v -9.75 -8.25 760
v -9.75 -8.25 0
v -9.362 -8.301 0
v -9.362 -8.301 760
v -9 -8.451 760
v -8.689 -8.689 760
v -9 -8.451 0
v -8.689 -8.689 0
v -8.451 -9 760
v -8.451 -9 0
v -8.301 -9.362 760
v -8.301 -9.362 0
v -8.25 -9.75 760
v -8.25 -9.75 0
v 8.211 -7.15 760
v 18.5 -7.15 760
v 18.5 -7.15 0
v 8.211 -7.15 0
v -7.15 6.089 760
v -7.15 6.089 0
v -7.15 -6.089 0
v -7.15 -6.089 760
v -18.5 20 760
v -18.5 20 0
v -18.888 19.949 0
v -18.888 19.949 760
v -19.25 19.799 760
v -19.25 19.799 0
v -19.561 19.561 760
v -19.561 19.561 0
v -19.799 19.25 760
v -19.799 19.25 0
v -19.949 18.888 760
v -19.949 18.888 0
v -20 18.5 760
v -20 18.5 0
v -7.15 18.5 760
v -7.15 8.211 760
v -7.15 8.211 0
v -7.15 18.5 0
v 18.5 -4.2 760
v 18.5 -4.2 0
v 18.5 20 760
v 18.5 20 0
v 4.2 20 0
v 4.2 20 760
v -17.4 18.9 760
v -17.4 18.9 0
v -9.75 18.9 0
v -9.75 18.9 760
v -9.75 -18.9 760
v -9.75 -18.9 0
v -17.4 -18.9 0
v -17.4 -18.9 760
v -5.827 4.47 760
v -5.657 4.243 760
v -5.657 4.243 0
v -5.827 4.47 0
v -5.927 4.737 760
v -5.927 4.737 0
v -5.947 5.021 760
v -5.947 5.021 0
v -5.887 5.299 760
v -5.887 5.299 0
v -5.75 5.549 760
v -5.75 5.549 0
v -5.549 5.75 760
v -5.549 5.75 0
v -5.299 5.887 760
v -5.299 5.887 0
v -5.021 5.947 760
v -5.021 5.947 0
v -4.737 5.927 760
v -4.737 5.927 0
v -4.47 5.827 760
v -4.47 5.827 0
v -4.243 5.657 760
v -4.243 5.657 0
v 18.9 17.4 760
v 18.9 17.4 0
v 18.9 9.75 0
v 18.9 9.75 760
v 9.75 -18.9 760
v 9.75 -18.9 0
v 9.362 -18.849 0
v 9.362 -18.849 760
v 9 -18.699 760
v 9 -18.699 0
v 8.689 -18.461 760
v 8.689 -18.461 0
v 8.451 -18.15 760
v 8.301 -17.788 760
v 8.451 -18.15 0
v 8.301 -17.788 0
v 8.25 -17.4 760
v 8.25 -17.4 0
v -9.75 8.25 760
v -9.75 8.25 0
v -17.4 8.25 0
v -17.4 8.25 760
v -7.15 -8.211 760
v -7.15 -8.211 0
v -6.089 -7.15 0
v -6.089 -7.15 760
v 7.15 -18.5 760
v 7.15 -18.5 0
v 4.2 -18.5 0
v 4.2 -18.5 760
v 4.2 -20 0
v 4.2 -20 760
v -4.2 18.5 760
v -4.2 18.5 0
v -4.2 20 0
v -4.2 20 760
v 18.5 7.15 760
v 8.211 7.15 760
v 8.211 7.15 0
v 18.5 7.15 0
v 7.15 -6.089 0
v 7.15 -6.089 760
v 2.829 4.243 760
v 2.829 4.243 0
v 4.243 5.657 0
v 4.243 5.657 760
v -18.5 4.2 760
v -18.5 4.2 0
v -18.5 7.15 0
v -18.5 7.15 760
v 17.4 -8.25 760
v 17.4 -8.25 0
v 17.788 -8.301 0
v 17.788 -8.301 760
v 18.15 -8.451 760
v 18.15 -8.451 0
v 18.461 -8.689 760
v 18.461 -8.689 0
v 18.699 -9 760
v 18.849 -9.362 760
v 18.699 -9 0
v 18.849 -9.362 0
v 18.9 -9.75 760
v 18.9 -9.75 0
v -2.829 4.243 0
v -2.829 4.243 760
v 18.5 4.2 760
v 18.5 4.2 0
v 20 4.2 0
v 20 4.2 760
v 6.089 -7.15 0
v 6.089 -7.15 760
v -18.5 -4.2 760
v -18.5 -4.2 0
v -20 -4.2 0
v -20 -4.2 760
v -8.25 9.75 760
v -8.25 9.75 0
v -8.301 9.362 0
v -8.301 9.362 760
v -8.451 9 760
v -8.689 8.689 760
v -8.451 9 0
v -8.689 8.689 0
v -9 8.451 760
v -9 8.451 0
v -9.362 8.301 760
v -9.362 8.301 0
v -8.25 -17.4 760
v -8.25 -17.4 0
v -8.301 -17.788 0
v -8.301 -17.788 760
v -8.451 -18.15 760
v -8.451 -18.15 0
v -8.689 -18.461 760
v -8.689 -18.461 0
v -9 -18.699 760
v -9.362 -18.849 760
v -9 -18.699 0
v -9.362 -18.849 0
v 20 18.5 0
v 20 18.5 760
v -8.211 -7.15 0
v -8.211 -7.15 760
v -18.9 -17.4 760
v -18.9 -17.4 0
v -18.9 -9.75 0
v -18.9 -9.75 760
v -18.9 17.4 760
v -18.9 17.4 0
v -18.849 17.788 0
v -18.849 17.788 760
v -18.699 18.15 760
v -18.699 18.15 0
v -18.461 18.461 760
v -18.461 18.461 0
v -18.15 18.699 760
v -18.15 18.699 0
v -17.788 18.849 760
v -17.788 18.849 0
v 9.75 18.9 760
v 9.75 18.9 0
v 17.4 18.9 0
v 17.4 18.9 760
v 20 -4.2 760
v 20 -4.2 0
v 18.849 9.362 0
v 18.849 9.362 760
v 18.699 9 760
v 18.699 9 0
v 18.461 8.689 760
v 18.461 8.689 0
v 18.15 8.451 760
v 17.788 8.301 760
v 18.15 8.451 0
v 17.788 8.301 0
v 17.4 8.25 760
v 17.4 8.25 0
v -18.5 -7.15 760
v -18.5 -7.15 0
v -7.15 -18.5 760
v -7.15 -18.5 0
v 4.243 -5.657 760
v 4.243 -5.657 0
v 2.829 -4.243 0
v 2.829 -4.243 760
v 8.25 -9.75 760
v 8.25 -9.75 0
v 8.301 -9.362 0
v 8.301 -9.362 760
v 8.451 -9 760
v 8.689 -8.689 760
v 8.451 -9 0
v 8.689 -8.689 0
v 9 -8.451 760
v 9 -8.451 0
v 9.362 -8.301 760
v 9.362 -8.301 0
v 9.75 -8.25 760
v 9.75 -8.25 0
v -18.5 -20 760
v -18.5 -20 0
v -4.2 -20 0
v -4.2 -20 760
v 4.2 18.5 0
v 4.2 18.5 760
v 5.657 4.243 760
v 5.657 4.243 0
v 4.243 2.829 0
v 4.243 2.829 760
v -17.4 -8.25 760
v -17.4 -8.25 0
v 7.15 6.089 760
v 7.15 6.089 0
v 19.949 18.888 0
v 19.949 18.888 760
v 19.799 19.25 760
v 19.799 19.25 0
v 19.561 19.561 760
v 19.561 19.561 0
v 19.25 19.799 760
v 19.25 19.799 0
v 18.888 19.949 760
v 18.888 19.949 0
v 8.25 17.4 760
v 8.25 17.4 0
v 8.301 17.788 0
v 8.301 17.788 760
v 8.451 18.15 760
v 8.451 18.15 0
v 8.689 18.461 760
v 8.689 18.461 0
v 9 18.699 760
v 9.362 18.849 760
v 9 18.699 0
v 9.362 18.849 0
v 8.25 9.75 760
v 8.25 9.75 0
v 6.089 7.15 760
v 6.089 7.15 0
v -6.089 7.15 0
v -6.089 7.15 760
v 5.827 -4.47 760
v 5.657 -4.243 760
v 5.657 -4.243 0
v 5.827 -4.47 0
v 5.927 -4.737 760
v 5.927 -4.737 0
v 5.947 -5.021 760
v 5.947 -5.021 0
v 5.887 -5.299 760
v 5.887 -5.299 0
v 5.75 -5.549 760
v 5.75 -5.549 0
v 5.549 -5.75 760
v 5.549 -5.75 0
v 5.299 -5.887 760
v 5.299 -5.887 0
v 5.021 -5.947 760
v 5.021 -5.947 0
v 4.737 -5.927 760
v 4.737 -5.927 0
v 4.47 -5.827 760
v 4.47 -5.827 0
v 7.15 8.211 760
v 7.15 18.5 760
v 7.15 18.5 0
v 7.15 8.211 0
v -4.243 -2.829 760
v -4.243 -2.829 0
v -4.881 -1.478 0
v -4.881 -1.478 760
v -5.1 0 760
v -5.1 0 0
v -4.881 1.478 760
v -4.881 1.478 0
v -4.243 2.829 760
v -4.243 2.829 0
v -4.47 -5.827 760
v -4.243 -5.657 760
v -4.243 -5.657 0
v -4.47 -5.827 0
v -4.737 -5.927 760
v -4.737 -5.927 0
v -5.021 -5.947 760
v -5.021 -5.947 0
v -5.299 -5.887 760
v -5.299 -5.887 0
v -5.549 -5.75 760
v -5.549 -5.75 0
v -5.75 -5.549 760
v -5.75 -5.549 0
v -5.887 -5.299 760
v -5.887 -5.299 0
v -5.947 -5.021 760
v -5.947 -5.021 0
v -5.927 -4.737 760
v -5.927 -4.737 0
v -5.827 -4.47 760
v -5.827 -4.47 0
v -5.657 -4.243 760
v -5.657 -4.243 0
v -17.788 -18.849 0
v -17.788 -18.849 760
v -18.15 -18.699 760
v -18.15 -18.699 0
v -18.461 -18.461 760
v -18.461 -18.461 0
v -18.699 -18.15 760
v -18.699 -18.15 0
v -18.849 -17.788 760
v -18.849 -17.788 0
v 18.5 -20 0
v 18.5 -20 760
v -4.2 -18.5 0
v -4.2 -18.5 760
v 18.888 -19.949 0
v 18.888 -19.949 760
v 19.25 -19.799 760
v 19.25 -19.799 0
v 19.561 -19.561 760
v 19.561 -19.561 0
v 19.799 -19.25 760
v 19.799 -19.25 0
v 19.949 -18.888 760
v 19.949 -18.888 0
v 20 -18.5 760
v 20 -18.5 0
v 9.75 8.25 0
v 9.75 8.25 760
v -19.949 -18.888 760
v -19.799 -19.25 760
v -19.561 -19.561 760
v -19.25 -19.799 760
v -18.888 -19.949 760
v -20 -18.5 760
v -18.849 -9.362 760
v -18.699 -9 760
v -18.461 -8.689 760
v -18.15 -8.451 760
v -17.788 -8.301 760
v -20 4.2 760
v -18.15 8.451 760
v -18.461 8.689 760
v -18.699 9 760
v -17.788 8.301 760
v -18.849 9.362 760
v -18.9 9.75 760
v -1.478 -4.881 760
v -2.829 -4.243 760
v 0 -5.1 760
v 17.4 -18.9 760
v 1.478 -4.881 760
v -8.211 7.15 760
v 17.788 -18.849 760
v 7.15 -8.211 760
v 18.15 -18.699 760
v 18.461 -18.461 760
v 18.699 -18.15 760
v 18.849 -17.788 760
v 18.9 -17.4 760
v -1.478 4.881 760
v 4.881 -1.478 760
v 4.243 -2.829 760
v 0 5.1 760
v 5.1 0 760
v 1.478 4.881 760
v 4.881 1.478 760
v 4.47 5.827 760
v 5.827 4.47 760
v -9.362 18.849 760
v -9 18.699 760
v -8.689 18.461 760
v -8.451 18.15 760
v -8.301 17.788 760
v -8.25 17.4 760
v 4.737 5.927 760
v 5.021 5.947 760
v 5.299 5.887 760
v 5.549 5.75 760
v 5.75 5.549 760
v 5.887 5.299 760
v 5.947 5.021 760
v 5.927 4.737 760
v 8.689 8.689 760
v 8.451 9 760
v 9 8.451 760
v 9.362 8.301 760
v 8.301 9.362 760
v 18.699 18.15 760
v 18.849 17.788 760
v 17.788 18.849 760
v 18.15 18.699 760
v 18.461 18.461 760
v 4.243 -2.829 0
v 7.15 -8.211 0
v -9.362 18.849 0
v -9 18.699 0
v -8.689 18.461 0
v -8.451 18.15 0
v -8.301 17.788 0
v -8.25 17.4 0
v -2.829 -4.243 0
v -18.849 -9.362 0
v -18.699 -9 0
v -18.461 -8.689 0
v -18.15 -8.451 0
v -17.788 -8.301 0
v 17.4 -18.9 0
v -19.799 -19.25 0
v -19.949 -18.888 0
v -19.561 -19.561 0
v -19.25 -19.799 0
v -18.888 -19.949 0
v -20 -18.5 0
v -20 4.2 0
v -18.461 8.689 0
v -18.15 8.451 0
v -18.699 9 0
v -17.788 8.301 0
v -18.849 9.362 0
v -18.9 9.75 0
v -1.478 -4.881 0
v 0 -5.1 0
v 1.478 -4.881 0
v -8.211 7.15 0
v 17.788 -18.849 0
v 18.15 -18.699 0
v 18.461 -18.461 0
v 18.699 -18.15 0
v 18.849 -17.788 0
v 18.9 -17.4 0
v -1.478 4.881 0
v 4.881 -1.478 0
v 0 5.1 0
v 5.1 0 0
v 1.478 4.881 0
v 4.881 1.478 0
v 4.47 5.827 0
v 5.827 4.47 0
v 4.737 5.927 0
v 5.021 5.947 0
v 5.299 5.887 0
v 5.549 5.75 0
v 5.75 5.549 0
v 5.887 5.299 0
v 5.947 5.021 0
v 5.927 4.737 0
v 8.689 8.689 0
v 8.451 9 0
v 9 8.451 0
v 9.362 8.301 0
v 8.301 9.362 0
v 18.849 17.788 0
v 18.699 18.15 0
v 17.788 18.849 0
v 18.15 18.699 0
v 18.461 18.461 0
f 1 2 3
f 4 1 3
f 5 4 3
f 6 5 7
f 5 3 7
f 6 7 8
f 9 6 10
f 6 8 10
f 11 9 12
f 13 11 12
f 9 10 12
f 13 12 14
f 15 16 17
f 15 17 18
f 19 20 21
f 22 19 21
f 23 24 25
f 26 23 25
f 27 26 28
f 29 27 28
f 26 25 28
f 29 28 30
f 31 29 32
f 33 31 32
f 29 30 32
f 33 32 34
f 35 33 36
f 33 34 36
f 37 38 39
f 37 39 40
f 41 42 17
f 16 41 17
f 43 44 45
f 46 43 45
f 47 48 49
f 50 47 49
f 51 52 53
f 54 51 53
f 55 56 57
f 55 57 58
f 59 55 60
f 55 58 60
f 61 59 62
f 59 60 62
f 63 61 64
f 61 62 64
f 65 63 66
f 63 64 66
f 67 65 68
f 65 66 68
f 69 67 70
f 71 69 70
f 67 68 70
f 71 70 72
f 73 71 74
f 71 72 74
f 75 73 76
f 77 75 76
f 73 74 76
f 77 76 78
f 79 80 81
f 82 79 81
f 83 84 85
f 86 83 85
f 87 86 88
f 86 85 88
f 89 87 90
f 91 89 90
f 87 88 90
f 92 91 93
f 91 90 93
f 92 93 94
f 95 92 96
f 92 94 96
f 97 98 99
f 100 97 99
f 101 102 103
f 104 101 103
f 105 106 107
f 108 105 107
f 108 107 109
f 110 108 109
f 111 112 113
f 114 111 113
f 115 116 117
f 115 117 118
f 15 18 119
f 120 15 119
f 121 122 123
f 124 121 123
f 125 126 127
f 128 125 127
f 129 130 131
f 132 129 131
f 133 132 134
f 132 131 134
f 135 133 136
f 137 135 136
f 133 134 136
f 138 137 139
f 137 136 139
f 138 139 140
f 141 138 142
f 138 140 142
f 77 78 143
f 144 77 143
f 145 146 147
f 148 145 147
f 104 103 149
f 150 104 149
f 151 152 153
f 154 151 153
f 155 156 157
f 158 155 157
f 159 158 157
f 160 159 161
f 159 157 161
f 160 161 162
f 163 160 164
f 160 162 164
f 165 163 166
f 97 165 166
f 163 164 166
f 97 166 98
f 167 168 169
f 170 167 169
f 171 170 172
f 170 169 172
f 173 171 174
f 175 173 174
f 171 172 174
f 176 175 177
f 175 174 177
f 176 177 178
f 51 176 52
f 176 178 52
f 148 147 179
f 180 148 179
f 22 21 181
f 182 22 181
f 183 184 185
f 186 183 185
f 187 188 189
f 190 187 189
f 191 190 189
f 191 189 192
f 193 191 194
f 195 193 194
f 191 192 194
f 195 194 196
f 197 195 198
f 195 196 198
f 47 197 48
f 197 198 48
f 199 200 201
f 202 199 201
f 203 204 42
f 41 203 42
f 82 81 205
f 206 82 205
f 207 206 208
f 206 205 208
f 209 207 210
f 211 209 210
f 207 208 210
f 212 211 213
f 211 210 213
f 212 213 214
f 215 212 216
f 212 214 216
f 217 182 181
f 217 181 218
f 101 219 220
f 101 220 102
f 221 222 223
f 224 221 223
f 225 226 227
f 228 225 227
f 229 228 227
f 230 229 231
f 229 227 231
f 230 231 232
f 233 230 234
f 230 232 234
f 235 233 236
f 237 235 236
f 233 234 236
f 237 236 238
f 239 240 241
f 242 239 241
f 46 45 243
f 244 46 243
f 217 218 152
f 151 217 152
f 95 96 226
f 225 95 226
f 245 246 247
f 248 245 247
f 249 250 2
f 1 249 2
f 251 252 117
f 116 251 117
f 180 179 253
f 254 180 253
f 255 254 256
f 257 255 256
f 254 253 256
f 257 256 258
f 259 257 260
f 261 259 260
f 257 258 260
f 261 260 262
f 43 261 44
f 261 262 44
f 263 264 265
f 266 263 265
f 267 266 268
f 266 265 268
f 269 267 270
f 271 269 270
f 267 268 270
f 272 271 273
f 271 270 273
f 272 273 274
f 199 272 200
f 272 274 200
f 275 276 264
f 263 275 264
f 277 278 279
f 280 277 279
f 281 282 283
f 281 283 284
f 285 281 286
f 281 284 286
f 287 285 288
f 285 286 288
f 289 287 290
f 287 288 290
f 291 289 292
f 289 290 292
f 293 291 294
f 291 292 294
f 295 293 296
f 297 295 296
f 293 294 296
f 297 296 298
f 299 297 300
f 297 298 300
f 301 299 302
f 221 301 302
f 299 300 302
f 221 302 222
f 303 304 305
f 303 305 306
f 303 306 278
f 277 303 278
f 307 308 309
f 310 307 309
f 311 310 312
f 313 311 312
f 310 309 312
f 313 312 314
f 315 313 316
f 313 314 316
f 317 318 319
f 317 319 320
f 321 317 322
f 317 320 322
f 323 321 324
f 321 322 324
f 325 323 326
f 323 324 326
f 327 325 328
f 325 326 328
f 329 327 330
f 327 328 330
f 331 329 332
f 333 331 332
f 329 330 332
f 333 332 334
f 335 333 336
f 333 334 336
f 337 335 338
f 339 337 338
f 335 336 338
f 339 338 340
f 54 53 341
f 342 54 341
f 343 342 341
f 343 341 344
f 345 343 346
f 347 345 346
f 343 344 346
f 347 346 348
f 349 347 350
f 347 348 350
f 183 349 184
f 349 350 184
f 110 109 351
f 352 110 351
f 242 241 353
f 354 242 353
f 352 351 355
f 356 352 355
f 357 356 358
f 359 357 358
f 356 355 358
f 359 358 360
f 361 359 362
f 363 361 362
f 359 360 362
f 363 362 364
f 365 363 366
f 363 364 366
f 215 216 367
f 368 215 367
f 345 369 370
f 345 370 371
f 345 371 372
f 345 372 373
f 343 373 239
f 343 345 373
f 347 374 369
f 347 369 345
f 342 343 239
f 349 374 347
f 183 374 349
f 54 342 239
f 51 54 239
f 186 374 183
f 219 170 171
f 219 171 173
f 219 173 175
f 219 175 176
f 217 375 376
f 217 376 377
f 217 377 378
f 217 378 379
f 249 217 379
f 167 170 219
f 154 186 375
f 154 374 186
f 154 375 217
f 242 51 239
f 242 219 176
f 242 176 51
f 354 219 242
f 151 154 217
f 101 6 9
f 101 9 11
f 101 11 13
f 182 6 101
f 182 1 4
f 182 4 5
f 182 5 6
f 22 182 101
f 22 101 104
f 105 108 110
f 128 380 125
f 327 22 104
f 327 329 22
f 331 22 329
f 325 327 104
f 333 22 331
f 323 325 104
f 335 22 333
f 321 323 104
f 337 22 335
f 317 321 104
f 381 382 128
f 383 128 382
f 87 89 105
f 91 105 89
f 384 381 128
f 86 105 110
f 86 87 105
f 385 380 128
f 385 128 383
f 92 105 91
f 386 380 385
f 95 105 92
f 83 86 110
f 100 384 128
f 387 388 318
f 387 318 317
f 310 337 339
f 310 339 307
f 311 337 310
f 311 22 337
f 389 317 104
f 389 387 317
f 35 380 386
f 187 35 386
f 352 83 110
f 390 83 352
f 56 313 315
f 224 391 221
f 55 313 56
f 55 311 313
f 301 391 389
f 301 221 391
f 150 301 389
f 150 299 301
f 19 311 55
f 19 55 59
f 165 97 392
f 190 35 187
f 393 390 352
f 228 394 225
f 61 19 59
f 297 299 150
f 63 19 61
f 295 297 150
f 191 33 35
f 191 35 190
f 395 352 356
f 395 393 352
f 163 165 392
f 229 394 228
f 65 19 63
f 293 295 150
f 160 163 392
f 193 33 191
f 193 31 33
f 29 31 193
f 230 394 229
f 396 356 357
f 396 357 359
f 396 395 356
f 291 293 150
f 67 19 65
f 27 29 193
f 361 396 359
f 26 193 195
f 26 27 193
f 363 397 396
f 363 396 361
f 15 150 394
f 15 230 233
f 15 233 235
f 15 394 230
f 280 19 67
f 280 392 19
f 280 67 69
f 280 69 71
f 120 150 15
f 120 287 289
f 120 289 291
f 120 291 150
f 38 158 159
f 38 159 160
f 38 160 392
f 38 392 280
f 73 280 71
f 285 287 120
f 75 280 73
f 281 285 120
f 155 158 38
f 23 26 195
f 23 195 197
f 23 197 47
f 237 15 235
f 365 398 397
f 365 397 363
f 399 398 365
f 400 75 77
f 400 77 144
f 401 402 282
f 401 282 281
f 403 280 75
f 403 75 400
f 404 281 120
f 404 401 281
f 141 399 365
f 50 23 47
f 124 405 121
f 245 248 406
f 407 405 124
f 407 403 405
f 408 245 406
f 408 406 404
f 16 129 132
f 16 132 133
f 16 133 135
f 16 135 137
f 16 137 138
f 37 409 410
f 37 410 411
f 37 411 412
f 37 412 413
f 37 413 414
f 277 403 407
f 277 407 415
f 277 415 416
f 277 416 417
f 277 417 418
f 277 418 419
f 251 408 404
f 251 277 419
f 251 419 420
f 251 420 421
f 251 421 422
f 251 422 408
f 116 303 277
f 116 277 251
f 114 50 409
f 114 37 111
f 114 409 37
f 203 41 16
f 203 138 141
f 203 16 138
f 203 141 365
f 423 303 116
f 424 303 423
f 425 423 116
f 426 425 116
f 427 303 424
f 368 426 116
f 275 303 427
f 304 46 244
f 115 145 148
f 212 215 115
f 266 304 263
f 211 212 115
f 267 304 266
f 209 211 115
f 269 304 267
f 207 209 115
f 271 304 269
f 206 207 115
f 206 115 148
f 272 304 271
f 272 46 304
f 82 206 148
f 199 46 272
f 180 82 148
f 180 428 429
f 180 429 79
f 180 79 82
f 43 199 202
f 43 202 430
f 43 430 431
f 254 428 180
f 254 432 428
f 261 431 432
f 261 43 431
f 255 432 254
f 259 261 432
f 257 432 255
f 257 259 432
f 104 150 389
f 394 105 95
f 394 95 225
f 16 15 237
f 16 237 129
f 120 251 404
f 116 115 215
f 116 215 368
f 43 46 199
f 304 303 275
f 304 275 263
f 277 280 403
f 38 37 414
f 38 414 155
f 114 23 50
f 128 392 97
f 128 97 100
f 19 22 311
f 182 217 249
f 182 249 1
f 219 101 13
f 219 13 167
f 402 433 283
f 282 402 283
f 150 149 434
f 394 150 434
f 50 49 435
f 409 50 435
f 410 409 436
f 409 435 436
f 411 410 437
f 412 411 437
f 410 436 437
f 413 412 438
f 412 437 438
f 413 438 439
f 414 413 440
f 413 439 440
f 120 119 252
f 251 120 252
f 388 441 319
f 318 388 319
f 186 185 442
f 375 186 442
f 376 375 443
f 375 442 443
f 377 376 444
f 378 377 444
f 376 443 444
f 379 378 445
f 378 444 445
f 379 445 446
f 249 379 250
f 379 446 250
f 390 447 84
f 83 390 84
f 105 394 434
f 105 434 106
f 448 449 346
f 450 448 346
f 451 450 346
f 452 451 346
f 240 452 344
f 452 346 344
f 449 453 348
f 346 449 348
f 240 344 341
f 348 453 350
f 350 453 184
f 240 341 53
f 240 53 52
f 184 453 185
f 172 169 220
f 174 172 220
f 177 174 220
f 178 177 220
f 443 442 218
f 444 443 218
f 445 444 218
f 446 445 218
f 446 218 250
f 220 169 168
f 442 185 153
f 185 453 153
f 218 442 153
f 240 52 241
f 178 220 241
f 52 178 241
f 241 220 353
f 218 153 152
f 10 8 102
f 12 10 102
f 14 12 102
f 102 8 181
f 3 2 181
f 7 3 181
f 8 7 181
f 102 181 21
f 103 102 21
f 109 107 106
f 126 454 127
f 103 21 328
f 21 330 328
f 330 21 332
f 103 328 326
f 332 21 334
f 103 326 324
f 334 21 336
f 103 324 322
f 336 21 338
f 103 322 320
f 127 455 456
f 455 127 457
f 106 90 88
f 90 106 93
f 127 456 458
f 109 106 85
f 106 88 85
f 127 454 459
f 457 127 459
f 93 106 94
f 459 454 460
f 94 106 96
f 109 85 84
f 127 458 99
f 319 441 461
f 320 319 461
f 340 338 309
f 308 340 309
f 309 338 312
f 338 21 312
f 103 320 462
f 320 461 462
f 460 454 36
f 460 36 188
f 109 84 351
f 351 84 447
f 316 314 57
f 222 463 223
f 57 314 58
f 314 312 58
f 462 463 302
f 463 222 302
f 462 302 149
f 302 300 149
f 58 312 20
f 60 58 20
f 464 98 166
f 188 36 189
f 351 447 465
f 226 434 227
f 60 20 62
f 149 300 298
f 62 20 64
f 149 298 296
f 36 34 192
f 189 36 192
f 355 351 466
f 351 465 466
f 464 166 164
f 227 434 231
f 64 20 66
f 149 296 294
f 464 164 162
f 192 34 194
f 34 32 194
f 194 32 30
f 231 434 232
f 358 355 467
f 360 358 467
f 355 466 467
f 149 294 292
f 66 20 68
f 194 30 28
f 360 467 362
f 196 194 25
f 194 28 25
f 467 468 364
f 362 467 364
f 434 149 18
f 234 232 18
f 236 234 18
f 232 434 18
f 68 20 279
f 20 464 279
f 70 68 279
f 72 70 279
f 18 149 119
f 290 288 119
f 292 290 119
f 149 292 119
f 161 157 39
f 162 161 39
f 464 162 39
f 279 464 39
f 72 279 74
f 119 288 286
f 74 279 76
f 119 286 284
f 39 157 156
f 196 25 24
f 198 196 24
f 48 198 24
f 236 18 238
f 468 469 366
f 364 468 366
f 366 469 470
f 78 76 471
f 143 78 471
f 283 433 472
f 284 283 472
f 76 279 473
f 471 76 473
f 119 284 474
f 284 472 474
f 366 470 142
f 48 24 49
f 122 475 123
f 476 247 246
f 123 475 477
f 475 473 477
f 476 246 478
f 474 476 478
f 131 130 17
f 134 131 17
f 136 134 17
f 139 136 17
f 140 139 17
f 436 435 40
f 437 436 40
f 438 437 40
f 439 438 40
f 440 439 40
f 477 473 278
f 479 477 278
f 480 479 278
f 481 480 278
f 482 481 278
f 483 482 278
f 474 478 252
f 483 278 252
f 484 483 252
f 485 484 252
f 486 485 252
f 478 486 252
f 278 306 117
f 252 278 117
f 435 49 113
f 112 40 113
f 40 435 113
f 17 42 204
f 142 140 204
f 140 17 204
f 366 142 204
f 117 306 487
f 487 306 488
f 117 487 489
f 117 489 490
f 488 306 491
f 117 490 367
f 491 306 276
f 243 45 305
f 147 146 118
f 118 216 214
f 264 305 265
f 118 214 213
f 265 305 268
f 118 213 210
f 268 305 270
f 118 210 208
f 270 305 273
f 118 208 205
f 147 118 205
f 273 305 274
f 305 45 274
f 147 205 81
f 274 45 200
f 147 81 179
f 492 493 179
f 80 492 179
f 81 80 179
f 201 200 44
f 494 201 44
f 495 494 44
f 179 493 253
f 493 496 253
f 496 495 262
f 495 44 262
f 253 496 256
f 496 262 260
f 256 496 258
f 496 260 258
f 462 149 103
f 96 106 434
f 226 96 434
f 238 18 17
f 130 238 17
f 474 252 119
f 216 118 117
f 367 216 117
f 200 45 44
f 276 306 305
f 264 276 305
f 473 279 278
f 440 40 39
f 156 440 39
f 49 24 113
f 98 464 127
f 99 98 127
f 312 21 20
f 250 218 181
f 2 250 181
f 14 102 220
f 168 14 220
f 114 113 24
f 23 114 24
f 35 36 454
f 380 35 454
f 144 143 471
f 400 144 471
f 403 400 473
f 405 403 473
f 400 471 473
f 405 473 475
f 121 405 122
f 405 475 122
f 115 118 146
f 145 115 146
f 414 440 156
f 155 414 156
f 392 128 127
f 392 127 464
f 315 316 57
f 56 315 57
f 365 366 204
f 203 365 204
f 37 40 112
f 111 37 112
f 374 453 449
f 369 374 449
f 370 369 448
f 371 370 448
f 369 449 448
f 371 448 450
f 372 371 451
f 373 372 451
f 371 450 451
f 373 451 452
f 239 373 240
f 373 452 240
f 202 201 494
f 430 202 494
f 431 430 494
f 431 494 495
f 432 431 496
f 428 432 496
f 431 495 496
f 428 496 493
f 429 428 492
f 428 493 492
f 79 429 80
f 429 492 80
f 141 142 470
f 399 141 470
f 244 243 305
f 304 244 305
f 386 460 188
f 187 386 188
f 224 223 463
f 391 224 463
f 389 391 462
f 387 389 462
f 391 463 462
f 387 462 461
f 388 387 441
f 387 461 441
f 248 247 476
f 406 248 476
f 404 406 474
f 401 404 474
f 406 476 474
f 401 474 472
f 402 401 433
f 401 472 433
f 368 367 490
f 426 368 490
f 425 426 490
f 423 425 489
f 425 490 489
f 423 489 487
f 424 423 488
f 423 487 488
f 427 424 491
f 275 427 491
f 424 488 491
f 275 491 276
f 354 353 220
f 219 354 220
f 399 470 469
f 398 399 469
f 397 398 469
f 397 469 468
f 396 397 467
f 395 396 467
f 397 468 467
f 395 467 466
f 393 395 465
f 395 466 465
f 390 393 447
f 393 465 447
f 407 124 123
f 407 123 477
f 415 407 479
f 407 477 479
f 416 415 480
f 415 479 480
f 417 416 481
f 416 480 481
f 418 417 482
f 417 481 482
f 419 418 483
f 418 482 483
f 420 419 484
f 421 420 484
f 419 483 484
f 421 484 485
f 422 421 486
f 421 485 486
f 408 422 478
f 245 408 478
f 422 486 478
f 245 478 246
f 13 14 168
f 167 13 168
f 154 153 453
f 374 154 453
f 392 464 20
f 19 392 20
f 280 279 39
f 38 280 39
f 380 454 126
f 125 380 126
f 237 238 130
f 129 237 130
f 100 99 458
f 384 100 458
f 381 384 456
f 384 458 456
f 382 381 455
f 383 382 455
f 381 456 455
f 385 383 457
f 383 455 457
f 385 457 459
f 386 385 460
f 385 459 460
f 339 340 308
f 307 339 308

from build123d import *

# Parameters (mm, degrees)
EXTRUDE_1_DEPTH = 760


with BuildPart() as part:
    # 草图1 → 凸台-拉伸1 (new body)
    with BuildSketch(Plane.XY):
        with BuildLine():
            Line((-6.089339828, -7.15), (6.089339828, -7.15))
            Line((6.089339828, -7.15), (7.15, -8.210660172))
            Line((7.15, -8.210660172), (7.15, -18.5))
            Line((7.15, -18.5), (4.2, -18.5))
            Line((4.2, -18.5), (4.2, -20))
            Line((4.2, -20), (18.5, -20))
            ThreePointArc((18.5, -20), (19.560660172, -19.560660172), (20, -18.5))
            Line((20, -18.5), (20, -4.2))
            Line((20, -4.2), (18.5, -4.2))
            Line((18.5, -4.2), (18.5, -7.15))
            Line((18.5, -7.15), (8.210660172, -7.15))
            Line((8.210660172, -7.15), (7.15, -6.089339828))
            Line((7.15, -6.089339828), (7.15, 6.089339828))
            Line((7.15, 6.089339828), (8.210660172, 7.15))
            Line((8.210660172, 7.15), (18.5, 7.15))
            Line((18.5, 7.15), (18.5, 4.2))
            Line((18.5, 4.2), (20, 4.2))
            Line((20, 4.2), (20, 18.5))
            ThreePointArc((20, 18.5), (19.560660172, 19.560660172), (18.5, 20))
            Line((18.5, 20), (4.2, 20))
            Line((4.2, 20), (4.2, 18.5))
            Line((4.2, 18.5), (7.15, 18.5))
            Line((7.15, 18.5), (7.15, 8.210660172))
            Line((7.15, 8.210660172), (6.089339828, 7.15))
            Line((6.089339828, 7.15), (-6.089339828, 7.15))
            Line((-6.089339828, 7.15), (-7.15, 8.210660172))
            Line((-7.15, 8.210660172), (-7.15, 18.5))
            Line((-7.15, 18.5), (-4.2, 18.5))
            Line((-4.2, 18.5), (-4.2, 20))
            Line((-4.2, 20), (-18.5, 20))
            ThreePointArc((-18.5, 20), (-19.560660172, 19.560660172), (-20, 18.5))
            Line((-20, 18.5), (-20, 4.2))
            Line((-20, 4.2), (-18.5, 4.2))
            Line((-18.5, 4.2), (-18.5, 7.15))
            Line((-18.5, 7.15), (-8.210660172, 7.15))
            Line((-8.210660172, 7.15), (-7.15, 6.089339828))
            Line((-7.15, 6.089339828), (-7.15, -6.089339828))
            Line((-7.15, -6.089339828), (-8.210660172, -7.15))
            Line((-8.210660172, -7.15), (-18.5, -7.15))
            Line((-18.5, -7.15), (-18.5, -4.2))
            Line((-18.5, -4.2), (-20, -4.2))
            Line((-20, -4.2), (-20, -18.5))
            ThreePointArc((-20, -18.5), (-19.560660172, -19.560660172), (-18.5, -20))
            Line((-18.5, -20), (-4.2, -20))
            Line((-4.2, -20), (-4.2, -18.5))
            Line((-4.2, -18.5), (-7.15, -18.5))
            Line((-7.15, -18.5), (-7.15, -8.210660172))
            Line((-7.15, -8.210660172), (-6.089339828, -7.15))
        make_face()
        with BuildLine():
            Line((17.4, 8.25), (9.75, 8.25))
            ThreePointArc((9.75, 8.25), (8.689339828, 8.689339828), (8.25, 9.75))
            Line((8.25, 9.75), (8.25, 17.4))
            ThreePointArc((8.25, 17.4), (8.689339828, 18.460660172), (9.75, 18.9))
            Line((9.75, 18.9), (17.4, 18.9))
            ThreePointArc((17.4, 18.9), (18.460660172, 18.460660172), (18.9, 17.4))
            Line((18.9, 17.4), (18.9, 9.75))
            ThreePointArc((18.9, 9.75), (18.460660172, 8.689339828), (17.4, 8.25))
        make_face(mode=Mode.SUBTRACT)
        with BuildLine():
            Line((-8.25, 17.4), (-8.25, 9.75))
            ThreePointArc((-8.25, 9.75), (-8.689339828, 8.689339828), (-9.75, 8.25))
            Line((-9.75, 8.25), (-17.4, 8.25))
            ThreePointArc((-17.4, 8.25), (-18.460660172, 8.689339828), (-18.9, 9.75))
            Line((-18.9, 9.75), (-18.9, 17.4))
            ThreePointArc((-18.9, 17.4), (-18.460660172, 18.460660172), (-17.4, 18.9))
            Line((-17.4, 18.9), (-9.75, 18.9))
            ThreePointArc((-9.75, 18.9), (-8.689339828, 18.460660172), (-8.25, 17.4))
        make_face(mode=Mode.SUBTRACT)
        with BuildLine():
            Line((-17.4, -8.25), (-9.75, -8.25))
            ThreePointArc((-9.75, -8.25), (-8.689339828, -8.689339828), (-8.25, -9.75))
            Line((-8.25, -9.75), (-8.25, -17.4))
            ThreePointArc((-8.25, -17.4), (-8.689339828, -18.460660172), (-9.75, -18.9))
            Line((-9.75, -18.9), (-17.4, -18.9))
            ThreePointArc((-17.4, -18.9), (-18.460660172, -18.460660172), (-18.9, -17.4))
            Line((-18.9, -17.4), (-18.9, -9.75))
            ThreePointArc((-18.9, -9.75), (-18.460660172, -8.689339828), (-17.4, -8.25))
        make_face(mode=Mode.SUBTRACT)
        with BuildLine():
            Line((8.25, -17.4), (8.25, -9.75))
            ThreePointArc((8.25, -9.75), (8.689339828, -8.689339828), (9.75, -8.25))
            Line((9.75, -8.25), (17.4, -8.25))
            ThreePointArc((17.4, -8.25), (18.460660172, -8.689339828), (18.9, -9.75))
            Line((18.9, -9.75), (18.9, -17.4))
            ThreePointArc((18.9, -17.4), (18.460660172, -18.460660172), (17.4, -18.9))
            Line((17.4, -18.9), (9.75, -18.9))
            ThreePointArc((9.75, -18.9), (8.689339828, -18.460660172), (8.25, -17.4))
        make_face(mode=Mode.SUBTRACT)
        with BuildLine():
            Line((-4.243347723, 2.829134161), (-5.656854249, 4.242640687))
            ThreePointArc((-5.656854249, 4.242640687), (-5.656854249, 5.656854249), (-4.242640687, 5.656854249))
            Line((-4.242640687, 5.656854249), (-2.829134161, 4.243347723))
            ThreePointArc((-2.829134161, 4.243347723), (0, 5.1), (2.829134161, 4.243347723))
            Line((2.829134161, 4.243347723), (4.242640687, 5.656854249))
            ThreePointArc((4.242640687, 5.656854249), (5.656854249, 5.656854249), (5.656854249, 4.242640687))
            Line((5.656854249, 4.242640687), (4.243347723, 2.829134161))
            ThreePointArc((4.243347723, 2.829134161), (5.1, 0), (4.243347723, -2.829134161))
            Line((4.243347723, -2.829134161), (5.656854249, -4.242640687))
            ThreePointArc((5.656854249, -4.242640687), (5.656854249, -5.656854249), (4.242640687, -5.656854249))
            Line((4.242640687, -5.656854249), (2.829134161, -4.243347723))
            ThreePointArc((2.829134161, -4.243347723), (0, -5.1), (-2.829134161, -4.243347723))
            Line((-2.829134161, -4.243347723), (-4.242640687, -5.656854249))
            ThreePointArc((-4.242640687, -5.656854249), (-5.656854249, -5.656854249), (-5.656854249, -4.242640687))
            Line((-5.656854249, -4.242640687), (-4.243347723, -2.829134161))
            ThreePointArc((-4.243347723, -2.829134161), (-5.1, 0), (-4.243347723, 2.829134161))
        make_face(mode=Mode.SUBTRACT)
    extrude(amount=EXTRUDE_1_DEPTH)


solid = part.part
